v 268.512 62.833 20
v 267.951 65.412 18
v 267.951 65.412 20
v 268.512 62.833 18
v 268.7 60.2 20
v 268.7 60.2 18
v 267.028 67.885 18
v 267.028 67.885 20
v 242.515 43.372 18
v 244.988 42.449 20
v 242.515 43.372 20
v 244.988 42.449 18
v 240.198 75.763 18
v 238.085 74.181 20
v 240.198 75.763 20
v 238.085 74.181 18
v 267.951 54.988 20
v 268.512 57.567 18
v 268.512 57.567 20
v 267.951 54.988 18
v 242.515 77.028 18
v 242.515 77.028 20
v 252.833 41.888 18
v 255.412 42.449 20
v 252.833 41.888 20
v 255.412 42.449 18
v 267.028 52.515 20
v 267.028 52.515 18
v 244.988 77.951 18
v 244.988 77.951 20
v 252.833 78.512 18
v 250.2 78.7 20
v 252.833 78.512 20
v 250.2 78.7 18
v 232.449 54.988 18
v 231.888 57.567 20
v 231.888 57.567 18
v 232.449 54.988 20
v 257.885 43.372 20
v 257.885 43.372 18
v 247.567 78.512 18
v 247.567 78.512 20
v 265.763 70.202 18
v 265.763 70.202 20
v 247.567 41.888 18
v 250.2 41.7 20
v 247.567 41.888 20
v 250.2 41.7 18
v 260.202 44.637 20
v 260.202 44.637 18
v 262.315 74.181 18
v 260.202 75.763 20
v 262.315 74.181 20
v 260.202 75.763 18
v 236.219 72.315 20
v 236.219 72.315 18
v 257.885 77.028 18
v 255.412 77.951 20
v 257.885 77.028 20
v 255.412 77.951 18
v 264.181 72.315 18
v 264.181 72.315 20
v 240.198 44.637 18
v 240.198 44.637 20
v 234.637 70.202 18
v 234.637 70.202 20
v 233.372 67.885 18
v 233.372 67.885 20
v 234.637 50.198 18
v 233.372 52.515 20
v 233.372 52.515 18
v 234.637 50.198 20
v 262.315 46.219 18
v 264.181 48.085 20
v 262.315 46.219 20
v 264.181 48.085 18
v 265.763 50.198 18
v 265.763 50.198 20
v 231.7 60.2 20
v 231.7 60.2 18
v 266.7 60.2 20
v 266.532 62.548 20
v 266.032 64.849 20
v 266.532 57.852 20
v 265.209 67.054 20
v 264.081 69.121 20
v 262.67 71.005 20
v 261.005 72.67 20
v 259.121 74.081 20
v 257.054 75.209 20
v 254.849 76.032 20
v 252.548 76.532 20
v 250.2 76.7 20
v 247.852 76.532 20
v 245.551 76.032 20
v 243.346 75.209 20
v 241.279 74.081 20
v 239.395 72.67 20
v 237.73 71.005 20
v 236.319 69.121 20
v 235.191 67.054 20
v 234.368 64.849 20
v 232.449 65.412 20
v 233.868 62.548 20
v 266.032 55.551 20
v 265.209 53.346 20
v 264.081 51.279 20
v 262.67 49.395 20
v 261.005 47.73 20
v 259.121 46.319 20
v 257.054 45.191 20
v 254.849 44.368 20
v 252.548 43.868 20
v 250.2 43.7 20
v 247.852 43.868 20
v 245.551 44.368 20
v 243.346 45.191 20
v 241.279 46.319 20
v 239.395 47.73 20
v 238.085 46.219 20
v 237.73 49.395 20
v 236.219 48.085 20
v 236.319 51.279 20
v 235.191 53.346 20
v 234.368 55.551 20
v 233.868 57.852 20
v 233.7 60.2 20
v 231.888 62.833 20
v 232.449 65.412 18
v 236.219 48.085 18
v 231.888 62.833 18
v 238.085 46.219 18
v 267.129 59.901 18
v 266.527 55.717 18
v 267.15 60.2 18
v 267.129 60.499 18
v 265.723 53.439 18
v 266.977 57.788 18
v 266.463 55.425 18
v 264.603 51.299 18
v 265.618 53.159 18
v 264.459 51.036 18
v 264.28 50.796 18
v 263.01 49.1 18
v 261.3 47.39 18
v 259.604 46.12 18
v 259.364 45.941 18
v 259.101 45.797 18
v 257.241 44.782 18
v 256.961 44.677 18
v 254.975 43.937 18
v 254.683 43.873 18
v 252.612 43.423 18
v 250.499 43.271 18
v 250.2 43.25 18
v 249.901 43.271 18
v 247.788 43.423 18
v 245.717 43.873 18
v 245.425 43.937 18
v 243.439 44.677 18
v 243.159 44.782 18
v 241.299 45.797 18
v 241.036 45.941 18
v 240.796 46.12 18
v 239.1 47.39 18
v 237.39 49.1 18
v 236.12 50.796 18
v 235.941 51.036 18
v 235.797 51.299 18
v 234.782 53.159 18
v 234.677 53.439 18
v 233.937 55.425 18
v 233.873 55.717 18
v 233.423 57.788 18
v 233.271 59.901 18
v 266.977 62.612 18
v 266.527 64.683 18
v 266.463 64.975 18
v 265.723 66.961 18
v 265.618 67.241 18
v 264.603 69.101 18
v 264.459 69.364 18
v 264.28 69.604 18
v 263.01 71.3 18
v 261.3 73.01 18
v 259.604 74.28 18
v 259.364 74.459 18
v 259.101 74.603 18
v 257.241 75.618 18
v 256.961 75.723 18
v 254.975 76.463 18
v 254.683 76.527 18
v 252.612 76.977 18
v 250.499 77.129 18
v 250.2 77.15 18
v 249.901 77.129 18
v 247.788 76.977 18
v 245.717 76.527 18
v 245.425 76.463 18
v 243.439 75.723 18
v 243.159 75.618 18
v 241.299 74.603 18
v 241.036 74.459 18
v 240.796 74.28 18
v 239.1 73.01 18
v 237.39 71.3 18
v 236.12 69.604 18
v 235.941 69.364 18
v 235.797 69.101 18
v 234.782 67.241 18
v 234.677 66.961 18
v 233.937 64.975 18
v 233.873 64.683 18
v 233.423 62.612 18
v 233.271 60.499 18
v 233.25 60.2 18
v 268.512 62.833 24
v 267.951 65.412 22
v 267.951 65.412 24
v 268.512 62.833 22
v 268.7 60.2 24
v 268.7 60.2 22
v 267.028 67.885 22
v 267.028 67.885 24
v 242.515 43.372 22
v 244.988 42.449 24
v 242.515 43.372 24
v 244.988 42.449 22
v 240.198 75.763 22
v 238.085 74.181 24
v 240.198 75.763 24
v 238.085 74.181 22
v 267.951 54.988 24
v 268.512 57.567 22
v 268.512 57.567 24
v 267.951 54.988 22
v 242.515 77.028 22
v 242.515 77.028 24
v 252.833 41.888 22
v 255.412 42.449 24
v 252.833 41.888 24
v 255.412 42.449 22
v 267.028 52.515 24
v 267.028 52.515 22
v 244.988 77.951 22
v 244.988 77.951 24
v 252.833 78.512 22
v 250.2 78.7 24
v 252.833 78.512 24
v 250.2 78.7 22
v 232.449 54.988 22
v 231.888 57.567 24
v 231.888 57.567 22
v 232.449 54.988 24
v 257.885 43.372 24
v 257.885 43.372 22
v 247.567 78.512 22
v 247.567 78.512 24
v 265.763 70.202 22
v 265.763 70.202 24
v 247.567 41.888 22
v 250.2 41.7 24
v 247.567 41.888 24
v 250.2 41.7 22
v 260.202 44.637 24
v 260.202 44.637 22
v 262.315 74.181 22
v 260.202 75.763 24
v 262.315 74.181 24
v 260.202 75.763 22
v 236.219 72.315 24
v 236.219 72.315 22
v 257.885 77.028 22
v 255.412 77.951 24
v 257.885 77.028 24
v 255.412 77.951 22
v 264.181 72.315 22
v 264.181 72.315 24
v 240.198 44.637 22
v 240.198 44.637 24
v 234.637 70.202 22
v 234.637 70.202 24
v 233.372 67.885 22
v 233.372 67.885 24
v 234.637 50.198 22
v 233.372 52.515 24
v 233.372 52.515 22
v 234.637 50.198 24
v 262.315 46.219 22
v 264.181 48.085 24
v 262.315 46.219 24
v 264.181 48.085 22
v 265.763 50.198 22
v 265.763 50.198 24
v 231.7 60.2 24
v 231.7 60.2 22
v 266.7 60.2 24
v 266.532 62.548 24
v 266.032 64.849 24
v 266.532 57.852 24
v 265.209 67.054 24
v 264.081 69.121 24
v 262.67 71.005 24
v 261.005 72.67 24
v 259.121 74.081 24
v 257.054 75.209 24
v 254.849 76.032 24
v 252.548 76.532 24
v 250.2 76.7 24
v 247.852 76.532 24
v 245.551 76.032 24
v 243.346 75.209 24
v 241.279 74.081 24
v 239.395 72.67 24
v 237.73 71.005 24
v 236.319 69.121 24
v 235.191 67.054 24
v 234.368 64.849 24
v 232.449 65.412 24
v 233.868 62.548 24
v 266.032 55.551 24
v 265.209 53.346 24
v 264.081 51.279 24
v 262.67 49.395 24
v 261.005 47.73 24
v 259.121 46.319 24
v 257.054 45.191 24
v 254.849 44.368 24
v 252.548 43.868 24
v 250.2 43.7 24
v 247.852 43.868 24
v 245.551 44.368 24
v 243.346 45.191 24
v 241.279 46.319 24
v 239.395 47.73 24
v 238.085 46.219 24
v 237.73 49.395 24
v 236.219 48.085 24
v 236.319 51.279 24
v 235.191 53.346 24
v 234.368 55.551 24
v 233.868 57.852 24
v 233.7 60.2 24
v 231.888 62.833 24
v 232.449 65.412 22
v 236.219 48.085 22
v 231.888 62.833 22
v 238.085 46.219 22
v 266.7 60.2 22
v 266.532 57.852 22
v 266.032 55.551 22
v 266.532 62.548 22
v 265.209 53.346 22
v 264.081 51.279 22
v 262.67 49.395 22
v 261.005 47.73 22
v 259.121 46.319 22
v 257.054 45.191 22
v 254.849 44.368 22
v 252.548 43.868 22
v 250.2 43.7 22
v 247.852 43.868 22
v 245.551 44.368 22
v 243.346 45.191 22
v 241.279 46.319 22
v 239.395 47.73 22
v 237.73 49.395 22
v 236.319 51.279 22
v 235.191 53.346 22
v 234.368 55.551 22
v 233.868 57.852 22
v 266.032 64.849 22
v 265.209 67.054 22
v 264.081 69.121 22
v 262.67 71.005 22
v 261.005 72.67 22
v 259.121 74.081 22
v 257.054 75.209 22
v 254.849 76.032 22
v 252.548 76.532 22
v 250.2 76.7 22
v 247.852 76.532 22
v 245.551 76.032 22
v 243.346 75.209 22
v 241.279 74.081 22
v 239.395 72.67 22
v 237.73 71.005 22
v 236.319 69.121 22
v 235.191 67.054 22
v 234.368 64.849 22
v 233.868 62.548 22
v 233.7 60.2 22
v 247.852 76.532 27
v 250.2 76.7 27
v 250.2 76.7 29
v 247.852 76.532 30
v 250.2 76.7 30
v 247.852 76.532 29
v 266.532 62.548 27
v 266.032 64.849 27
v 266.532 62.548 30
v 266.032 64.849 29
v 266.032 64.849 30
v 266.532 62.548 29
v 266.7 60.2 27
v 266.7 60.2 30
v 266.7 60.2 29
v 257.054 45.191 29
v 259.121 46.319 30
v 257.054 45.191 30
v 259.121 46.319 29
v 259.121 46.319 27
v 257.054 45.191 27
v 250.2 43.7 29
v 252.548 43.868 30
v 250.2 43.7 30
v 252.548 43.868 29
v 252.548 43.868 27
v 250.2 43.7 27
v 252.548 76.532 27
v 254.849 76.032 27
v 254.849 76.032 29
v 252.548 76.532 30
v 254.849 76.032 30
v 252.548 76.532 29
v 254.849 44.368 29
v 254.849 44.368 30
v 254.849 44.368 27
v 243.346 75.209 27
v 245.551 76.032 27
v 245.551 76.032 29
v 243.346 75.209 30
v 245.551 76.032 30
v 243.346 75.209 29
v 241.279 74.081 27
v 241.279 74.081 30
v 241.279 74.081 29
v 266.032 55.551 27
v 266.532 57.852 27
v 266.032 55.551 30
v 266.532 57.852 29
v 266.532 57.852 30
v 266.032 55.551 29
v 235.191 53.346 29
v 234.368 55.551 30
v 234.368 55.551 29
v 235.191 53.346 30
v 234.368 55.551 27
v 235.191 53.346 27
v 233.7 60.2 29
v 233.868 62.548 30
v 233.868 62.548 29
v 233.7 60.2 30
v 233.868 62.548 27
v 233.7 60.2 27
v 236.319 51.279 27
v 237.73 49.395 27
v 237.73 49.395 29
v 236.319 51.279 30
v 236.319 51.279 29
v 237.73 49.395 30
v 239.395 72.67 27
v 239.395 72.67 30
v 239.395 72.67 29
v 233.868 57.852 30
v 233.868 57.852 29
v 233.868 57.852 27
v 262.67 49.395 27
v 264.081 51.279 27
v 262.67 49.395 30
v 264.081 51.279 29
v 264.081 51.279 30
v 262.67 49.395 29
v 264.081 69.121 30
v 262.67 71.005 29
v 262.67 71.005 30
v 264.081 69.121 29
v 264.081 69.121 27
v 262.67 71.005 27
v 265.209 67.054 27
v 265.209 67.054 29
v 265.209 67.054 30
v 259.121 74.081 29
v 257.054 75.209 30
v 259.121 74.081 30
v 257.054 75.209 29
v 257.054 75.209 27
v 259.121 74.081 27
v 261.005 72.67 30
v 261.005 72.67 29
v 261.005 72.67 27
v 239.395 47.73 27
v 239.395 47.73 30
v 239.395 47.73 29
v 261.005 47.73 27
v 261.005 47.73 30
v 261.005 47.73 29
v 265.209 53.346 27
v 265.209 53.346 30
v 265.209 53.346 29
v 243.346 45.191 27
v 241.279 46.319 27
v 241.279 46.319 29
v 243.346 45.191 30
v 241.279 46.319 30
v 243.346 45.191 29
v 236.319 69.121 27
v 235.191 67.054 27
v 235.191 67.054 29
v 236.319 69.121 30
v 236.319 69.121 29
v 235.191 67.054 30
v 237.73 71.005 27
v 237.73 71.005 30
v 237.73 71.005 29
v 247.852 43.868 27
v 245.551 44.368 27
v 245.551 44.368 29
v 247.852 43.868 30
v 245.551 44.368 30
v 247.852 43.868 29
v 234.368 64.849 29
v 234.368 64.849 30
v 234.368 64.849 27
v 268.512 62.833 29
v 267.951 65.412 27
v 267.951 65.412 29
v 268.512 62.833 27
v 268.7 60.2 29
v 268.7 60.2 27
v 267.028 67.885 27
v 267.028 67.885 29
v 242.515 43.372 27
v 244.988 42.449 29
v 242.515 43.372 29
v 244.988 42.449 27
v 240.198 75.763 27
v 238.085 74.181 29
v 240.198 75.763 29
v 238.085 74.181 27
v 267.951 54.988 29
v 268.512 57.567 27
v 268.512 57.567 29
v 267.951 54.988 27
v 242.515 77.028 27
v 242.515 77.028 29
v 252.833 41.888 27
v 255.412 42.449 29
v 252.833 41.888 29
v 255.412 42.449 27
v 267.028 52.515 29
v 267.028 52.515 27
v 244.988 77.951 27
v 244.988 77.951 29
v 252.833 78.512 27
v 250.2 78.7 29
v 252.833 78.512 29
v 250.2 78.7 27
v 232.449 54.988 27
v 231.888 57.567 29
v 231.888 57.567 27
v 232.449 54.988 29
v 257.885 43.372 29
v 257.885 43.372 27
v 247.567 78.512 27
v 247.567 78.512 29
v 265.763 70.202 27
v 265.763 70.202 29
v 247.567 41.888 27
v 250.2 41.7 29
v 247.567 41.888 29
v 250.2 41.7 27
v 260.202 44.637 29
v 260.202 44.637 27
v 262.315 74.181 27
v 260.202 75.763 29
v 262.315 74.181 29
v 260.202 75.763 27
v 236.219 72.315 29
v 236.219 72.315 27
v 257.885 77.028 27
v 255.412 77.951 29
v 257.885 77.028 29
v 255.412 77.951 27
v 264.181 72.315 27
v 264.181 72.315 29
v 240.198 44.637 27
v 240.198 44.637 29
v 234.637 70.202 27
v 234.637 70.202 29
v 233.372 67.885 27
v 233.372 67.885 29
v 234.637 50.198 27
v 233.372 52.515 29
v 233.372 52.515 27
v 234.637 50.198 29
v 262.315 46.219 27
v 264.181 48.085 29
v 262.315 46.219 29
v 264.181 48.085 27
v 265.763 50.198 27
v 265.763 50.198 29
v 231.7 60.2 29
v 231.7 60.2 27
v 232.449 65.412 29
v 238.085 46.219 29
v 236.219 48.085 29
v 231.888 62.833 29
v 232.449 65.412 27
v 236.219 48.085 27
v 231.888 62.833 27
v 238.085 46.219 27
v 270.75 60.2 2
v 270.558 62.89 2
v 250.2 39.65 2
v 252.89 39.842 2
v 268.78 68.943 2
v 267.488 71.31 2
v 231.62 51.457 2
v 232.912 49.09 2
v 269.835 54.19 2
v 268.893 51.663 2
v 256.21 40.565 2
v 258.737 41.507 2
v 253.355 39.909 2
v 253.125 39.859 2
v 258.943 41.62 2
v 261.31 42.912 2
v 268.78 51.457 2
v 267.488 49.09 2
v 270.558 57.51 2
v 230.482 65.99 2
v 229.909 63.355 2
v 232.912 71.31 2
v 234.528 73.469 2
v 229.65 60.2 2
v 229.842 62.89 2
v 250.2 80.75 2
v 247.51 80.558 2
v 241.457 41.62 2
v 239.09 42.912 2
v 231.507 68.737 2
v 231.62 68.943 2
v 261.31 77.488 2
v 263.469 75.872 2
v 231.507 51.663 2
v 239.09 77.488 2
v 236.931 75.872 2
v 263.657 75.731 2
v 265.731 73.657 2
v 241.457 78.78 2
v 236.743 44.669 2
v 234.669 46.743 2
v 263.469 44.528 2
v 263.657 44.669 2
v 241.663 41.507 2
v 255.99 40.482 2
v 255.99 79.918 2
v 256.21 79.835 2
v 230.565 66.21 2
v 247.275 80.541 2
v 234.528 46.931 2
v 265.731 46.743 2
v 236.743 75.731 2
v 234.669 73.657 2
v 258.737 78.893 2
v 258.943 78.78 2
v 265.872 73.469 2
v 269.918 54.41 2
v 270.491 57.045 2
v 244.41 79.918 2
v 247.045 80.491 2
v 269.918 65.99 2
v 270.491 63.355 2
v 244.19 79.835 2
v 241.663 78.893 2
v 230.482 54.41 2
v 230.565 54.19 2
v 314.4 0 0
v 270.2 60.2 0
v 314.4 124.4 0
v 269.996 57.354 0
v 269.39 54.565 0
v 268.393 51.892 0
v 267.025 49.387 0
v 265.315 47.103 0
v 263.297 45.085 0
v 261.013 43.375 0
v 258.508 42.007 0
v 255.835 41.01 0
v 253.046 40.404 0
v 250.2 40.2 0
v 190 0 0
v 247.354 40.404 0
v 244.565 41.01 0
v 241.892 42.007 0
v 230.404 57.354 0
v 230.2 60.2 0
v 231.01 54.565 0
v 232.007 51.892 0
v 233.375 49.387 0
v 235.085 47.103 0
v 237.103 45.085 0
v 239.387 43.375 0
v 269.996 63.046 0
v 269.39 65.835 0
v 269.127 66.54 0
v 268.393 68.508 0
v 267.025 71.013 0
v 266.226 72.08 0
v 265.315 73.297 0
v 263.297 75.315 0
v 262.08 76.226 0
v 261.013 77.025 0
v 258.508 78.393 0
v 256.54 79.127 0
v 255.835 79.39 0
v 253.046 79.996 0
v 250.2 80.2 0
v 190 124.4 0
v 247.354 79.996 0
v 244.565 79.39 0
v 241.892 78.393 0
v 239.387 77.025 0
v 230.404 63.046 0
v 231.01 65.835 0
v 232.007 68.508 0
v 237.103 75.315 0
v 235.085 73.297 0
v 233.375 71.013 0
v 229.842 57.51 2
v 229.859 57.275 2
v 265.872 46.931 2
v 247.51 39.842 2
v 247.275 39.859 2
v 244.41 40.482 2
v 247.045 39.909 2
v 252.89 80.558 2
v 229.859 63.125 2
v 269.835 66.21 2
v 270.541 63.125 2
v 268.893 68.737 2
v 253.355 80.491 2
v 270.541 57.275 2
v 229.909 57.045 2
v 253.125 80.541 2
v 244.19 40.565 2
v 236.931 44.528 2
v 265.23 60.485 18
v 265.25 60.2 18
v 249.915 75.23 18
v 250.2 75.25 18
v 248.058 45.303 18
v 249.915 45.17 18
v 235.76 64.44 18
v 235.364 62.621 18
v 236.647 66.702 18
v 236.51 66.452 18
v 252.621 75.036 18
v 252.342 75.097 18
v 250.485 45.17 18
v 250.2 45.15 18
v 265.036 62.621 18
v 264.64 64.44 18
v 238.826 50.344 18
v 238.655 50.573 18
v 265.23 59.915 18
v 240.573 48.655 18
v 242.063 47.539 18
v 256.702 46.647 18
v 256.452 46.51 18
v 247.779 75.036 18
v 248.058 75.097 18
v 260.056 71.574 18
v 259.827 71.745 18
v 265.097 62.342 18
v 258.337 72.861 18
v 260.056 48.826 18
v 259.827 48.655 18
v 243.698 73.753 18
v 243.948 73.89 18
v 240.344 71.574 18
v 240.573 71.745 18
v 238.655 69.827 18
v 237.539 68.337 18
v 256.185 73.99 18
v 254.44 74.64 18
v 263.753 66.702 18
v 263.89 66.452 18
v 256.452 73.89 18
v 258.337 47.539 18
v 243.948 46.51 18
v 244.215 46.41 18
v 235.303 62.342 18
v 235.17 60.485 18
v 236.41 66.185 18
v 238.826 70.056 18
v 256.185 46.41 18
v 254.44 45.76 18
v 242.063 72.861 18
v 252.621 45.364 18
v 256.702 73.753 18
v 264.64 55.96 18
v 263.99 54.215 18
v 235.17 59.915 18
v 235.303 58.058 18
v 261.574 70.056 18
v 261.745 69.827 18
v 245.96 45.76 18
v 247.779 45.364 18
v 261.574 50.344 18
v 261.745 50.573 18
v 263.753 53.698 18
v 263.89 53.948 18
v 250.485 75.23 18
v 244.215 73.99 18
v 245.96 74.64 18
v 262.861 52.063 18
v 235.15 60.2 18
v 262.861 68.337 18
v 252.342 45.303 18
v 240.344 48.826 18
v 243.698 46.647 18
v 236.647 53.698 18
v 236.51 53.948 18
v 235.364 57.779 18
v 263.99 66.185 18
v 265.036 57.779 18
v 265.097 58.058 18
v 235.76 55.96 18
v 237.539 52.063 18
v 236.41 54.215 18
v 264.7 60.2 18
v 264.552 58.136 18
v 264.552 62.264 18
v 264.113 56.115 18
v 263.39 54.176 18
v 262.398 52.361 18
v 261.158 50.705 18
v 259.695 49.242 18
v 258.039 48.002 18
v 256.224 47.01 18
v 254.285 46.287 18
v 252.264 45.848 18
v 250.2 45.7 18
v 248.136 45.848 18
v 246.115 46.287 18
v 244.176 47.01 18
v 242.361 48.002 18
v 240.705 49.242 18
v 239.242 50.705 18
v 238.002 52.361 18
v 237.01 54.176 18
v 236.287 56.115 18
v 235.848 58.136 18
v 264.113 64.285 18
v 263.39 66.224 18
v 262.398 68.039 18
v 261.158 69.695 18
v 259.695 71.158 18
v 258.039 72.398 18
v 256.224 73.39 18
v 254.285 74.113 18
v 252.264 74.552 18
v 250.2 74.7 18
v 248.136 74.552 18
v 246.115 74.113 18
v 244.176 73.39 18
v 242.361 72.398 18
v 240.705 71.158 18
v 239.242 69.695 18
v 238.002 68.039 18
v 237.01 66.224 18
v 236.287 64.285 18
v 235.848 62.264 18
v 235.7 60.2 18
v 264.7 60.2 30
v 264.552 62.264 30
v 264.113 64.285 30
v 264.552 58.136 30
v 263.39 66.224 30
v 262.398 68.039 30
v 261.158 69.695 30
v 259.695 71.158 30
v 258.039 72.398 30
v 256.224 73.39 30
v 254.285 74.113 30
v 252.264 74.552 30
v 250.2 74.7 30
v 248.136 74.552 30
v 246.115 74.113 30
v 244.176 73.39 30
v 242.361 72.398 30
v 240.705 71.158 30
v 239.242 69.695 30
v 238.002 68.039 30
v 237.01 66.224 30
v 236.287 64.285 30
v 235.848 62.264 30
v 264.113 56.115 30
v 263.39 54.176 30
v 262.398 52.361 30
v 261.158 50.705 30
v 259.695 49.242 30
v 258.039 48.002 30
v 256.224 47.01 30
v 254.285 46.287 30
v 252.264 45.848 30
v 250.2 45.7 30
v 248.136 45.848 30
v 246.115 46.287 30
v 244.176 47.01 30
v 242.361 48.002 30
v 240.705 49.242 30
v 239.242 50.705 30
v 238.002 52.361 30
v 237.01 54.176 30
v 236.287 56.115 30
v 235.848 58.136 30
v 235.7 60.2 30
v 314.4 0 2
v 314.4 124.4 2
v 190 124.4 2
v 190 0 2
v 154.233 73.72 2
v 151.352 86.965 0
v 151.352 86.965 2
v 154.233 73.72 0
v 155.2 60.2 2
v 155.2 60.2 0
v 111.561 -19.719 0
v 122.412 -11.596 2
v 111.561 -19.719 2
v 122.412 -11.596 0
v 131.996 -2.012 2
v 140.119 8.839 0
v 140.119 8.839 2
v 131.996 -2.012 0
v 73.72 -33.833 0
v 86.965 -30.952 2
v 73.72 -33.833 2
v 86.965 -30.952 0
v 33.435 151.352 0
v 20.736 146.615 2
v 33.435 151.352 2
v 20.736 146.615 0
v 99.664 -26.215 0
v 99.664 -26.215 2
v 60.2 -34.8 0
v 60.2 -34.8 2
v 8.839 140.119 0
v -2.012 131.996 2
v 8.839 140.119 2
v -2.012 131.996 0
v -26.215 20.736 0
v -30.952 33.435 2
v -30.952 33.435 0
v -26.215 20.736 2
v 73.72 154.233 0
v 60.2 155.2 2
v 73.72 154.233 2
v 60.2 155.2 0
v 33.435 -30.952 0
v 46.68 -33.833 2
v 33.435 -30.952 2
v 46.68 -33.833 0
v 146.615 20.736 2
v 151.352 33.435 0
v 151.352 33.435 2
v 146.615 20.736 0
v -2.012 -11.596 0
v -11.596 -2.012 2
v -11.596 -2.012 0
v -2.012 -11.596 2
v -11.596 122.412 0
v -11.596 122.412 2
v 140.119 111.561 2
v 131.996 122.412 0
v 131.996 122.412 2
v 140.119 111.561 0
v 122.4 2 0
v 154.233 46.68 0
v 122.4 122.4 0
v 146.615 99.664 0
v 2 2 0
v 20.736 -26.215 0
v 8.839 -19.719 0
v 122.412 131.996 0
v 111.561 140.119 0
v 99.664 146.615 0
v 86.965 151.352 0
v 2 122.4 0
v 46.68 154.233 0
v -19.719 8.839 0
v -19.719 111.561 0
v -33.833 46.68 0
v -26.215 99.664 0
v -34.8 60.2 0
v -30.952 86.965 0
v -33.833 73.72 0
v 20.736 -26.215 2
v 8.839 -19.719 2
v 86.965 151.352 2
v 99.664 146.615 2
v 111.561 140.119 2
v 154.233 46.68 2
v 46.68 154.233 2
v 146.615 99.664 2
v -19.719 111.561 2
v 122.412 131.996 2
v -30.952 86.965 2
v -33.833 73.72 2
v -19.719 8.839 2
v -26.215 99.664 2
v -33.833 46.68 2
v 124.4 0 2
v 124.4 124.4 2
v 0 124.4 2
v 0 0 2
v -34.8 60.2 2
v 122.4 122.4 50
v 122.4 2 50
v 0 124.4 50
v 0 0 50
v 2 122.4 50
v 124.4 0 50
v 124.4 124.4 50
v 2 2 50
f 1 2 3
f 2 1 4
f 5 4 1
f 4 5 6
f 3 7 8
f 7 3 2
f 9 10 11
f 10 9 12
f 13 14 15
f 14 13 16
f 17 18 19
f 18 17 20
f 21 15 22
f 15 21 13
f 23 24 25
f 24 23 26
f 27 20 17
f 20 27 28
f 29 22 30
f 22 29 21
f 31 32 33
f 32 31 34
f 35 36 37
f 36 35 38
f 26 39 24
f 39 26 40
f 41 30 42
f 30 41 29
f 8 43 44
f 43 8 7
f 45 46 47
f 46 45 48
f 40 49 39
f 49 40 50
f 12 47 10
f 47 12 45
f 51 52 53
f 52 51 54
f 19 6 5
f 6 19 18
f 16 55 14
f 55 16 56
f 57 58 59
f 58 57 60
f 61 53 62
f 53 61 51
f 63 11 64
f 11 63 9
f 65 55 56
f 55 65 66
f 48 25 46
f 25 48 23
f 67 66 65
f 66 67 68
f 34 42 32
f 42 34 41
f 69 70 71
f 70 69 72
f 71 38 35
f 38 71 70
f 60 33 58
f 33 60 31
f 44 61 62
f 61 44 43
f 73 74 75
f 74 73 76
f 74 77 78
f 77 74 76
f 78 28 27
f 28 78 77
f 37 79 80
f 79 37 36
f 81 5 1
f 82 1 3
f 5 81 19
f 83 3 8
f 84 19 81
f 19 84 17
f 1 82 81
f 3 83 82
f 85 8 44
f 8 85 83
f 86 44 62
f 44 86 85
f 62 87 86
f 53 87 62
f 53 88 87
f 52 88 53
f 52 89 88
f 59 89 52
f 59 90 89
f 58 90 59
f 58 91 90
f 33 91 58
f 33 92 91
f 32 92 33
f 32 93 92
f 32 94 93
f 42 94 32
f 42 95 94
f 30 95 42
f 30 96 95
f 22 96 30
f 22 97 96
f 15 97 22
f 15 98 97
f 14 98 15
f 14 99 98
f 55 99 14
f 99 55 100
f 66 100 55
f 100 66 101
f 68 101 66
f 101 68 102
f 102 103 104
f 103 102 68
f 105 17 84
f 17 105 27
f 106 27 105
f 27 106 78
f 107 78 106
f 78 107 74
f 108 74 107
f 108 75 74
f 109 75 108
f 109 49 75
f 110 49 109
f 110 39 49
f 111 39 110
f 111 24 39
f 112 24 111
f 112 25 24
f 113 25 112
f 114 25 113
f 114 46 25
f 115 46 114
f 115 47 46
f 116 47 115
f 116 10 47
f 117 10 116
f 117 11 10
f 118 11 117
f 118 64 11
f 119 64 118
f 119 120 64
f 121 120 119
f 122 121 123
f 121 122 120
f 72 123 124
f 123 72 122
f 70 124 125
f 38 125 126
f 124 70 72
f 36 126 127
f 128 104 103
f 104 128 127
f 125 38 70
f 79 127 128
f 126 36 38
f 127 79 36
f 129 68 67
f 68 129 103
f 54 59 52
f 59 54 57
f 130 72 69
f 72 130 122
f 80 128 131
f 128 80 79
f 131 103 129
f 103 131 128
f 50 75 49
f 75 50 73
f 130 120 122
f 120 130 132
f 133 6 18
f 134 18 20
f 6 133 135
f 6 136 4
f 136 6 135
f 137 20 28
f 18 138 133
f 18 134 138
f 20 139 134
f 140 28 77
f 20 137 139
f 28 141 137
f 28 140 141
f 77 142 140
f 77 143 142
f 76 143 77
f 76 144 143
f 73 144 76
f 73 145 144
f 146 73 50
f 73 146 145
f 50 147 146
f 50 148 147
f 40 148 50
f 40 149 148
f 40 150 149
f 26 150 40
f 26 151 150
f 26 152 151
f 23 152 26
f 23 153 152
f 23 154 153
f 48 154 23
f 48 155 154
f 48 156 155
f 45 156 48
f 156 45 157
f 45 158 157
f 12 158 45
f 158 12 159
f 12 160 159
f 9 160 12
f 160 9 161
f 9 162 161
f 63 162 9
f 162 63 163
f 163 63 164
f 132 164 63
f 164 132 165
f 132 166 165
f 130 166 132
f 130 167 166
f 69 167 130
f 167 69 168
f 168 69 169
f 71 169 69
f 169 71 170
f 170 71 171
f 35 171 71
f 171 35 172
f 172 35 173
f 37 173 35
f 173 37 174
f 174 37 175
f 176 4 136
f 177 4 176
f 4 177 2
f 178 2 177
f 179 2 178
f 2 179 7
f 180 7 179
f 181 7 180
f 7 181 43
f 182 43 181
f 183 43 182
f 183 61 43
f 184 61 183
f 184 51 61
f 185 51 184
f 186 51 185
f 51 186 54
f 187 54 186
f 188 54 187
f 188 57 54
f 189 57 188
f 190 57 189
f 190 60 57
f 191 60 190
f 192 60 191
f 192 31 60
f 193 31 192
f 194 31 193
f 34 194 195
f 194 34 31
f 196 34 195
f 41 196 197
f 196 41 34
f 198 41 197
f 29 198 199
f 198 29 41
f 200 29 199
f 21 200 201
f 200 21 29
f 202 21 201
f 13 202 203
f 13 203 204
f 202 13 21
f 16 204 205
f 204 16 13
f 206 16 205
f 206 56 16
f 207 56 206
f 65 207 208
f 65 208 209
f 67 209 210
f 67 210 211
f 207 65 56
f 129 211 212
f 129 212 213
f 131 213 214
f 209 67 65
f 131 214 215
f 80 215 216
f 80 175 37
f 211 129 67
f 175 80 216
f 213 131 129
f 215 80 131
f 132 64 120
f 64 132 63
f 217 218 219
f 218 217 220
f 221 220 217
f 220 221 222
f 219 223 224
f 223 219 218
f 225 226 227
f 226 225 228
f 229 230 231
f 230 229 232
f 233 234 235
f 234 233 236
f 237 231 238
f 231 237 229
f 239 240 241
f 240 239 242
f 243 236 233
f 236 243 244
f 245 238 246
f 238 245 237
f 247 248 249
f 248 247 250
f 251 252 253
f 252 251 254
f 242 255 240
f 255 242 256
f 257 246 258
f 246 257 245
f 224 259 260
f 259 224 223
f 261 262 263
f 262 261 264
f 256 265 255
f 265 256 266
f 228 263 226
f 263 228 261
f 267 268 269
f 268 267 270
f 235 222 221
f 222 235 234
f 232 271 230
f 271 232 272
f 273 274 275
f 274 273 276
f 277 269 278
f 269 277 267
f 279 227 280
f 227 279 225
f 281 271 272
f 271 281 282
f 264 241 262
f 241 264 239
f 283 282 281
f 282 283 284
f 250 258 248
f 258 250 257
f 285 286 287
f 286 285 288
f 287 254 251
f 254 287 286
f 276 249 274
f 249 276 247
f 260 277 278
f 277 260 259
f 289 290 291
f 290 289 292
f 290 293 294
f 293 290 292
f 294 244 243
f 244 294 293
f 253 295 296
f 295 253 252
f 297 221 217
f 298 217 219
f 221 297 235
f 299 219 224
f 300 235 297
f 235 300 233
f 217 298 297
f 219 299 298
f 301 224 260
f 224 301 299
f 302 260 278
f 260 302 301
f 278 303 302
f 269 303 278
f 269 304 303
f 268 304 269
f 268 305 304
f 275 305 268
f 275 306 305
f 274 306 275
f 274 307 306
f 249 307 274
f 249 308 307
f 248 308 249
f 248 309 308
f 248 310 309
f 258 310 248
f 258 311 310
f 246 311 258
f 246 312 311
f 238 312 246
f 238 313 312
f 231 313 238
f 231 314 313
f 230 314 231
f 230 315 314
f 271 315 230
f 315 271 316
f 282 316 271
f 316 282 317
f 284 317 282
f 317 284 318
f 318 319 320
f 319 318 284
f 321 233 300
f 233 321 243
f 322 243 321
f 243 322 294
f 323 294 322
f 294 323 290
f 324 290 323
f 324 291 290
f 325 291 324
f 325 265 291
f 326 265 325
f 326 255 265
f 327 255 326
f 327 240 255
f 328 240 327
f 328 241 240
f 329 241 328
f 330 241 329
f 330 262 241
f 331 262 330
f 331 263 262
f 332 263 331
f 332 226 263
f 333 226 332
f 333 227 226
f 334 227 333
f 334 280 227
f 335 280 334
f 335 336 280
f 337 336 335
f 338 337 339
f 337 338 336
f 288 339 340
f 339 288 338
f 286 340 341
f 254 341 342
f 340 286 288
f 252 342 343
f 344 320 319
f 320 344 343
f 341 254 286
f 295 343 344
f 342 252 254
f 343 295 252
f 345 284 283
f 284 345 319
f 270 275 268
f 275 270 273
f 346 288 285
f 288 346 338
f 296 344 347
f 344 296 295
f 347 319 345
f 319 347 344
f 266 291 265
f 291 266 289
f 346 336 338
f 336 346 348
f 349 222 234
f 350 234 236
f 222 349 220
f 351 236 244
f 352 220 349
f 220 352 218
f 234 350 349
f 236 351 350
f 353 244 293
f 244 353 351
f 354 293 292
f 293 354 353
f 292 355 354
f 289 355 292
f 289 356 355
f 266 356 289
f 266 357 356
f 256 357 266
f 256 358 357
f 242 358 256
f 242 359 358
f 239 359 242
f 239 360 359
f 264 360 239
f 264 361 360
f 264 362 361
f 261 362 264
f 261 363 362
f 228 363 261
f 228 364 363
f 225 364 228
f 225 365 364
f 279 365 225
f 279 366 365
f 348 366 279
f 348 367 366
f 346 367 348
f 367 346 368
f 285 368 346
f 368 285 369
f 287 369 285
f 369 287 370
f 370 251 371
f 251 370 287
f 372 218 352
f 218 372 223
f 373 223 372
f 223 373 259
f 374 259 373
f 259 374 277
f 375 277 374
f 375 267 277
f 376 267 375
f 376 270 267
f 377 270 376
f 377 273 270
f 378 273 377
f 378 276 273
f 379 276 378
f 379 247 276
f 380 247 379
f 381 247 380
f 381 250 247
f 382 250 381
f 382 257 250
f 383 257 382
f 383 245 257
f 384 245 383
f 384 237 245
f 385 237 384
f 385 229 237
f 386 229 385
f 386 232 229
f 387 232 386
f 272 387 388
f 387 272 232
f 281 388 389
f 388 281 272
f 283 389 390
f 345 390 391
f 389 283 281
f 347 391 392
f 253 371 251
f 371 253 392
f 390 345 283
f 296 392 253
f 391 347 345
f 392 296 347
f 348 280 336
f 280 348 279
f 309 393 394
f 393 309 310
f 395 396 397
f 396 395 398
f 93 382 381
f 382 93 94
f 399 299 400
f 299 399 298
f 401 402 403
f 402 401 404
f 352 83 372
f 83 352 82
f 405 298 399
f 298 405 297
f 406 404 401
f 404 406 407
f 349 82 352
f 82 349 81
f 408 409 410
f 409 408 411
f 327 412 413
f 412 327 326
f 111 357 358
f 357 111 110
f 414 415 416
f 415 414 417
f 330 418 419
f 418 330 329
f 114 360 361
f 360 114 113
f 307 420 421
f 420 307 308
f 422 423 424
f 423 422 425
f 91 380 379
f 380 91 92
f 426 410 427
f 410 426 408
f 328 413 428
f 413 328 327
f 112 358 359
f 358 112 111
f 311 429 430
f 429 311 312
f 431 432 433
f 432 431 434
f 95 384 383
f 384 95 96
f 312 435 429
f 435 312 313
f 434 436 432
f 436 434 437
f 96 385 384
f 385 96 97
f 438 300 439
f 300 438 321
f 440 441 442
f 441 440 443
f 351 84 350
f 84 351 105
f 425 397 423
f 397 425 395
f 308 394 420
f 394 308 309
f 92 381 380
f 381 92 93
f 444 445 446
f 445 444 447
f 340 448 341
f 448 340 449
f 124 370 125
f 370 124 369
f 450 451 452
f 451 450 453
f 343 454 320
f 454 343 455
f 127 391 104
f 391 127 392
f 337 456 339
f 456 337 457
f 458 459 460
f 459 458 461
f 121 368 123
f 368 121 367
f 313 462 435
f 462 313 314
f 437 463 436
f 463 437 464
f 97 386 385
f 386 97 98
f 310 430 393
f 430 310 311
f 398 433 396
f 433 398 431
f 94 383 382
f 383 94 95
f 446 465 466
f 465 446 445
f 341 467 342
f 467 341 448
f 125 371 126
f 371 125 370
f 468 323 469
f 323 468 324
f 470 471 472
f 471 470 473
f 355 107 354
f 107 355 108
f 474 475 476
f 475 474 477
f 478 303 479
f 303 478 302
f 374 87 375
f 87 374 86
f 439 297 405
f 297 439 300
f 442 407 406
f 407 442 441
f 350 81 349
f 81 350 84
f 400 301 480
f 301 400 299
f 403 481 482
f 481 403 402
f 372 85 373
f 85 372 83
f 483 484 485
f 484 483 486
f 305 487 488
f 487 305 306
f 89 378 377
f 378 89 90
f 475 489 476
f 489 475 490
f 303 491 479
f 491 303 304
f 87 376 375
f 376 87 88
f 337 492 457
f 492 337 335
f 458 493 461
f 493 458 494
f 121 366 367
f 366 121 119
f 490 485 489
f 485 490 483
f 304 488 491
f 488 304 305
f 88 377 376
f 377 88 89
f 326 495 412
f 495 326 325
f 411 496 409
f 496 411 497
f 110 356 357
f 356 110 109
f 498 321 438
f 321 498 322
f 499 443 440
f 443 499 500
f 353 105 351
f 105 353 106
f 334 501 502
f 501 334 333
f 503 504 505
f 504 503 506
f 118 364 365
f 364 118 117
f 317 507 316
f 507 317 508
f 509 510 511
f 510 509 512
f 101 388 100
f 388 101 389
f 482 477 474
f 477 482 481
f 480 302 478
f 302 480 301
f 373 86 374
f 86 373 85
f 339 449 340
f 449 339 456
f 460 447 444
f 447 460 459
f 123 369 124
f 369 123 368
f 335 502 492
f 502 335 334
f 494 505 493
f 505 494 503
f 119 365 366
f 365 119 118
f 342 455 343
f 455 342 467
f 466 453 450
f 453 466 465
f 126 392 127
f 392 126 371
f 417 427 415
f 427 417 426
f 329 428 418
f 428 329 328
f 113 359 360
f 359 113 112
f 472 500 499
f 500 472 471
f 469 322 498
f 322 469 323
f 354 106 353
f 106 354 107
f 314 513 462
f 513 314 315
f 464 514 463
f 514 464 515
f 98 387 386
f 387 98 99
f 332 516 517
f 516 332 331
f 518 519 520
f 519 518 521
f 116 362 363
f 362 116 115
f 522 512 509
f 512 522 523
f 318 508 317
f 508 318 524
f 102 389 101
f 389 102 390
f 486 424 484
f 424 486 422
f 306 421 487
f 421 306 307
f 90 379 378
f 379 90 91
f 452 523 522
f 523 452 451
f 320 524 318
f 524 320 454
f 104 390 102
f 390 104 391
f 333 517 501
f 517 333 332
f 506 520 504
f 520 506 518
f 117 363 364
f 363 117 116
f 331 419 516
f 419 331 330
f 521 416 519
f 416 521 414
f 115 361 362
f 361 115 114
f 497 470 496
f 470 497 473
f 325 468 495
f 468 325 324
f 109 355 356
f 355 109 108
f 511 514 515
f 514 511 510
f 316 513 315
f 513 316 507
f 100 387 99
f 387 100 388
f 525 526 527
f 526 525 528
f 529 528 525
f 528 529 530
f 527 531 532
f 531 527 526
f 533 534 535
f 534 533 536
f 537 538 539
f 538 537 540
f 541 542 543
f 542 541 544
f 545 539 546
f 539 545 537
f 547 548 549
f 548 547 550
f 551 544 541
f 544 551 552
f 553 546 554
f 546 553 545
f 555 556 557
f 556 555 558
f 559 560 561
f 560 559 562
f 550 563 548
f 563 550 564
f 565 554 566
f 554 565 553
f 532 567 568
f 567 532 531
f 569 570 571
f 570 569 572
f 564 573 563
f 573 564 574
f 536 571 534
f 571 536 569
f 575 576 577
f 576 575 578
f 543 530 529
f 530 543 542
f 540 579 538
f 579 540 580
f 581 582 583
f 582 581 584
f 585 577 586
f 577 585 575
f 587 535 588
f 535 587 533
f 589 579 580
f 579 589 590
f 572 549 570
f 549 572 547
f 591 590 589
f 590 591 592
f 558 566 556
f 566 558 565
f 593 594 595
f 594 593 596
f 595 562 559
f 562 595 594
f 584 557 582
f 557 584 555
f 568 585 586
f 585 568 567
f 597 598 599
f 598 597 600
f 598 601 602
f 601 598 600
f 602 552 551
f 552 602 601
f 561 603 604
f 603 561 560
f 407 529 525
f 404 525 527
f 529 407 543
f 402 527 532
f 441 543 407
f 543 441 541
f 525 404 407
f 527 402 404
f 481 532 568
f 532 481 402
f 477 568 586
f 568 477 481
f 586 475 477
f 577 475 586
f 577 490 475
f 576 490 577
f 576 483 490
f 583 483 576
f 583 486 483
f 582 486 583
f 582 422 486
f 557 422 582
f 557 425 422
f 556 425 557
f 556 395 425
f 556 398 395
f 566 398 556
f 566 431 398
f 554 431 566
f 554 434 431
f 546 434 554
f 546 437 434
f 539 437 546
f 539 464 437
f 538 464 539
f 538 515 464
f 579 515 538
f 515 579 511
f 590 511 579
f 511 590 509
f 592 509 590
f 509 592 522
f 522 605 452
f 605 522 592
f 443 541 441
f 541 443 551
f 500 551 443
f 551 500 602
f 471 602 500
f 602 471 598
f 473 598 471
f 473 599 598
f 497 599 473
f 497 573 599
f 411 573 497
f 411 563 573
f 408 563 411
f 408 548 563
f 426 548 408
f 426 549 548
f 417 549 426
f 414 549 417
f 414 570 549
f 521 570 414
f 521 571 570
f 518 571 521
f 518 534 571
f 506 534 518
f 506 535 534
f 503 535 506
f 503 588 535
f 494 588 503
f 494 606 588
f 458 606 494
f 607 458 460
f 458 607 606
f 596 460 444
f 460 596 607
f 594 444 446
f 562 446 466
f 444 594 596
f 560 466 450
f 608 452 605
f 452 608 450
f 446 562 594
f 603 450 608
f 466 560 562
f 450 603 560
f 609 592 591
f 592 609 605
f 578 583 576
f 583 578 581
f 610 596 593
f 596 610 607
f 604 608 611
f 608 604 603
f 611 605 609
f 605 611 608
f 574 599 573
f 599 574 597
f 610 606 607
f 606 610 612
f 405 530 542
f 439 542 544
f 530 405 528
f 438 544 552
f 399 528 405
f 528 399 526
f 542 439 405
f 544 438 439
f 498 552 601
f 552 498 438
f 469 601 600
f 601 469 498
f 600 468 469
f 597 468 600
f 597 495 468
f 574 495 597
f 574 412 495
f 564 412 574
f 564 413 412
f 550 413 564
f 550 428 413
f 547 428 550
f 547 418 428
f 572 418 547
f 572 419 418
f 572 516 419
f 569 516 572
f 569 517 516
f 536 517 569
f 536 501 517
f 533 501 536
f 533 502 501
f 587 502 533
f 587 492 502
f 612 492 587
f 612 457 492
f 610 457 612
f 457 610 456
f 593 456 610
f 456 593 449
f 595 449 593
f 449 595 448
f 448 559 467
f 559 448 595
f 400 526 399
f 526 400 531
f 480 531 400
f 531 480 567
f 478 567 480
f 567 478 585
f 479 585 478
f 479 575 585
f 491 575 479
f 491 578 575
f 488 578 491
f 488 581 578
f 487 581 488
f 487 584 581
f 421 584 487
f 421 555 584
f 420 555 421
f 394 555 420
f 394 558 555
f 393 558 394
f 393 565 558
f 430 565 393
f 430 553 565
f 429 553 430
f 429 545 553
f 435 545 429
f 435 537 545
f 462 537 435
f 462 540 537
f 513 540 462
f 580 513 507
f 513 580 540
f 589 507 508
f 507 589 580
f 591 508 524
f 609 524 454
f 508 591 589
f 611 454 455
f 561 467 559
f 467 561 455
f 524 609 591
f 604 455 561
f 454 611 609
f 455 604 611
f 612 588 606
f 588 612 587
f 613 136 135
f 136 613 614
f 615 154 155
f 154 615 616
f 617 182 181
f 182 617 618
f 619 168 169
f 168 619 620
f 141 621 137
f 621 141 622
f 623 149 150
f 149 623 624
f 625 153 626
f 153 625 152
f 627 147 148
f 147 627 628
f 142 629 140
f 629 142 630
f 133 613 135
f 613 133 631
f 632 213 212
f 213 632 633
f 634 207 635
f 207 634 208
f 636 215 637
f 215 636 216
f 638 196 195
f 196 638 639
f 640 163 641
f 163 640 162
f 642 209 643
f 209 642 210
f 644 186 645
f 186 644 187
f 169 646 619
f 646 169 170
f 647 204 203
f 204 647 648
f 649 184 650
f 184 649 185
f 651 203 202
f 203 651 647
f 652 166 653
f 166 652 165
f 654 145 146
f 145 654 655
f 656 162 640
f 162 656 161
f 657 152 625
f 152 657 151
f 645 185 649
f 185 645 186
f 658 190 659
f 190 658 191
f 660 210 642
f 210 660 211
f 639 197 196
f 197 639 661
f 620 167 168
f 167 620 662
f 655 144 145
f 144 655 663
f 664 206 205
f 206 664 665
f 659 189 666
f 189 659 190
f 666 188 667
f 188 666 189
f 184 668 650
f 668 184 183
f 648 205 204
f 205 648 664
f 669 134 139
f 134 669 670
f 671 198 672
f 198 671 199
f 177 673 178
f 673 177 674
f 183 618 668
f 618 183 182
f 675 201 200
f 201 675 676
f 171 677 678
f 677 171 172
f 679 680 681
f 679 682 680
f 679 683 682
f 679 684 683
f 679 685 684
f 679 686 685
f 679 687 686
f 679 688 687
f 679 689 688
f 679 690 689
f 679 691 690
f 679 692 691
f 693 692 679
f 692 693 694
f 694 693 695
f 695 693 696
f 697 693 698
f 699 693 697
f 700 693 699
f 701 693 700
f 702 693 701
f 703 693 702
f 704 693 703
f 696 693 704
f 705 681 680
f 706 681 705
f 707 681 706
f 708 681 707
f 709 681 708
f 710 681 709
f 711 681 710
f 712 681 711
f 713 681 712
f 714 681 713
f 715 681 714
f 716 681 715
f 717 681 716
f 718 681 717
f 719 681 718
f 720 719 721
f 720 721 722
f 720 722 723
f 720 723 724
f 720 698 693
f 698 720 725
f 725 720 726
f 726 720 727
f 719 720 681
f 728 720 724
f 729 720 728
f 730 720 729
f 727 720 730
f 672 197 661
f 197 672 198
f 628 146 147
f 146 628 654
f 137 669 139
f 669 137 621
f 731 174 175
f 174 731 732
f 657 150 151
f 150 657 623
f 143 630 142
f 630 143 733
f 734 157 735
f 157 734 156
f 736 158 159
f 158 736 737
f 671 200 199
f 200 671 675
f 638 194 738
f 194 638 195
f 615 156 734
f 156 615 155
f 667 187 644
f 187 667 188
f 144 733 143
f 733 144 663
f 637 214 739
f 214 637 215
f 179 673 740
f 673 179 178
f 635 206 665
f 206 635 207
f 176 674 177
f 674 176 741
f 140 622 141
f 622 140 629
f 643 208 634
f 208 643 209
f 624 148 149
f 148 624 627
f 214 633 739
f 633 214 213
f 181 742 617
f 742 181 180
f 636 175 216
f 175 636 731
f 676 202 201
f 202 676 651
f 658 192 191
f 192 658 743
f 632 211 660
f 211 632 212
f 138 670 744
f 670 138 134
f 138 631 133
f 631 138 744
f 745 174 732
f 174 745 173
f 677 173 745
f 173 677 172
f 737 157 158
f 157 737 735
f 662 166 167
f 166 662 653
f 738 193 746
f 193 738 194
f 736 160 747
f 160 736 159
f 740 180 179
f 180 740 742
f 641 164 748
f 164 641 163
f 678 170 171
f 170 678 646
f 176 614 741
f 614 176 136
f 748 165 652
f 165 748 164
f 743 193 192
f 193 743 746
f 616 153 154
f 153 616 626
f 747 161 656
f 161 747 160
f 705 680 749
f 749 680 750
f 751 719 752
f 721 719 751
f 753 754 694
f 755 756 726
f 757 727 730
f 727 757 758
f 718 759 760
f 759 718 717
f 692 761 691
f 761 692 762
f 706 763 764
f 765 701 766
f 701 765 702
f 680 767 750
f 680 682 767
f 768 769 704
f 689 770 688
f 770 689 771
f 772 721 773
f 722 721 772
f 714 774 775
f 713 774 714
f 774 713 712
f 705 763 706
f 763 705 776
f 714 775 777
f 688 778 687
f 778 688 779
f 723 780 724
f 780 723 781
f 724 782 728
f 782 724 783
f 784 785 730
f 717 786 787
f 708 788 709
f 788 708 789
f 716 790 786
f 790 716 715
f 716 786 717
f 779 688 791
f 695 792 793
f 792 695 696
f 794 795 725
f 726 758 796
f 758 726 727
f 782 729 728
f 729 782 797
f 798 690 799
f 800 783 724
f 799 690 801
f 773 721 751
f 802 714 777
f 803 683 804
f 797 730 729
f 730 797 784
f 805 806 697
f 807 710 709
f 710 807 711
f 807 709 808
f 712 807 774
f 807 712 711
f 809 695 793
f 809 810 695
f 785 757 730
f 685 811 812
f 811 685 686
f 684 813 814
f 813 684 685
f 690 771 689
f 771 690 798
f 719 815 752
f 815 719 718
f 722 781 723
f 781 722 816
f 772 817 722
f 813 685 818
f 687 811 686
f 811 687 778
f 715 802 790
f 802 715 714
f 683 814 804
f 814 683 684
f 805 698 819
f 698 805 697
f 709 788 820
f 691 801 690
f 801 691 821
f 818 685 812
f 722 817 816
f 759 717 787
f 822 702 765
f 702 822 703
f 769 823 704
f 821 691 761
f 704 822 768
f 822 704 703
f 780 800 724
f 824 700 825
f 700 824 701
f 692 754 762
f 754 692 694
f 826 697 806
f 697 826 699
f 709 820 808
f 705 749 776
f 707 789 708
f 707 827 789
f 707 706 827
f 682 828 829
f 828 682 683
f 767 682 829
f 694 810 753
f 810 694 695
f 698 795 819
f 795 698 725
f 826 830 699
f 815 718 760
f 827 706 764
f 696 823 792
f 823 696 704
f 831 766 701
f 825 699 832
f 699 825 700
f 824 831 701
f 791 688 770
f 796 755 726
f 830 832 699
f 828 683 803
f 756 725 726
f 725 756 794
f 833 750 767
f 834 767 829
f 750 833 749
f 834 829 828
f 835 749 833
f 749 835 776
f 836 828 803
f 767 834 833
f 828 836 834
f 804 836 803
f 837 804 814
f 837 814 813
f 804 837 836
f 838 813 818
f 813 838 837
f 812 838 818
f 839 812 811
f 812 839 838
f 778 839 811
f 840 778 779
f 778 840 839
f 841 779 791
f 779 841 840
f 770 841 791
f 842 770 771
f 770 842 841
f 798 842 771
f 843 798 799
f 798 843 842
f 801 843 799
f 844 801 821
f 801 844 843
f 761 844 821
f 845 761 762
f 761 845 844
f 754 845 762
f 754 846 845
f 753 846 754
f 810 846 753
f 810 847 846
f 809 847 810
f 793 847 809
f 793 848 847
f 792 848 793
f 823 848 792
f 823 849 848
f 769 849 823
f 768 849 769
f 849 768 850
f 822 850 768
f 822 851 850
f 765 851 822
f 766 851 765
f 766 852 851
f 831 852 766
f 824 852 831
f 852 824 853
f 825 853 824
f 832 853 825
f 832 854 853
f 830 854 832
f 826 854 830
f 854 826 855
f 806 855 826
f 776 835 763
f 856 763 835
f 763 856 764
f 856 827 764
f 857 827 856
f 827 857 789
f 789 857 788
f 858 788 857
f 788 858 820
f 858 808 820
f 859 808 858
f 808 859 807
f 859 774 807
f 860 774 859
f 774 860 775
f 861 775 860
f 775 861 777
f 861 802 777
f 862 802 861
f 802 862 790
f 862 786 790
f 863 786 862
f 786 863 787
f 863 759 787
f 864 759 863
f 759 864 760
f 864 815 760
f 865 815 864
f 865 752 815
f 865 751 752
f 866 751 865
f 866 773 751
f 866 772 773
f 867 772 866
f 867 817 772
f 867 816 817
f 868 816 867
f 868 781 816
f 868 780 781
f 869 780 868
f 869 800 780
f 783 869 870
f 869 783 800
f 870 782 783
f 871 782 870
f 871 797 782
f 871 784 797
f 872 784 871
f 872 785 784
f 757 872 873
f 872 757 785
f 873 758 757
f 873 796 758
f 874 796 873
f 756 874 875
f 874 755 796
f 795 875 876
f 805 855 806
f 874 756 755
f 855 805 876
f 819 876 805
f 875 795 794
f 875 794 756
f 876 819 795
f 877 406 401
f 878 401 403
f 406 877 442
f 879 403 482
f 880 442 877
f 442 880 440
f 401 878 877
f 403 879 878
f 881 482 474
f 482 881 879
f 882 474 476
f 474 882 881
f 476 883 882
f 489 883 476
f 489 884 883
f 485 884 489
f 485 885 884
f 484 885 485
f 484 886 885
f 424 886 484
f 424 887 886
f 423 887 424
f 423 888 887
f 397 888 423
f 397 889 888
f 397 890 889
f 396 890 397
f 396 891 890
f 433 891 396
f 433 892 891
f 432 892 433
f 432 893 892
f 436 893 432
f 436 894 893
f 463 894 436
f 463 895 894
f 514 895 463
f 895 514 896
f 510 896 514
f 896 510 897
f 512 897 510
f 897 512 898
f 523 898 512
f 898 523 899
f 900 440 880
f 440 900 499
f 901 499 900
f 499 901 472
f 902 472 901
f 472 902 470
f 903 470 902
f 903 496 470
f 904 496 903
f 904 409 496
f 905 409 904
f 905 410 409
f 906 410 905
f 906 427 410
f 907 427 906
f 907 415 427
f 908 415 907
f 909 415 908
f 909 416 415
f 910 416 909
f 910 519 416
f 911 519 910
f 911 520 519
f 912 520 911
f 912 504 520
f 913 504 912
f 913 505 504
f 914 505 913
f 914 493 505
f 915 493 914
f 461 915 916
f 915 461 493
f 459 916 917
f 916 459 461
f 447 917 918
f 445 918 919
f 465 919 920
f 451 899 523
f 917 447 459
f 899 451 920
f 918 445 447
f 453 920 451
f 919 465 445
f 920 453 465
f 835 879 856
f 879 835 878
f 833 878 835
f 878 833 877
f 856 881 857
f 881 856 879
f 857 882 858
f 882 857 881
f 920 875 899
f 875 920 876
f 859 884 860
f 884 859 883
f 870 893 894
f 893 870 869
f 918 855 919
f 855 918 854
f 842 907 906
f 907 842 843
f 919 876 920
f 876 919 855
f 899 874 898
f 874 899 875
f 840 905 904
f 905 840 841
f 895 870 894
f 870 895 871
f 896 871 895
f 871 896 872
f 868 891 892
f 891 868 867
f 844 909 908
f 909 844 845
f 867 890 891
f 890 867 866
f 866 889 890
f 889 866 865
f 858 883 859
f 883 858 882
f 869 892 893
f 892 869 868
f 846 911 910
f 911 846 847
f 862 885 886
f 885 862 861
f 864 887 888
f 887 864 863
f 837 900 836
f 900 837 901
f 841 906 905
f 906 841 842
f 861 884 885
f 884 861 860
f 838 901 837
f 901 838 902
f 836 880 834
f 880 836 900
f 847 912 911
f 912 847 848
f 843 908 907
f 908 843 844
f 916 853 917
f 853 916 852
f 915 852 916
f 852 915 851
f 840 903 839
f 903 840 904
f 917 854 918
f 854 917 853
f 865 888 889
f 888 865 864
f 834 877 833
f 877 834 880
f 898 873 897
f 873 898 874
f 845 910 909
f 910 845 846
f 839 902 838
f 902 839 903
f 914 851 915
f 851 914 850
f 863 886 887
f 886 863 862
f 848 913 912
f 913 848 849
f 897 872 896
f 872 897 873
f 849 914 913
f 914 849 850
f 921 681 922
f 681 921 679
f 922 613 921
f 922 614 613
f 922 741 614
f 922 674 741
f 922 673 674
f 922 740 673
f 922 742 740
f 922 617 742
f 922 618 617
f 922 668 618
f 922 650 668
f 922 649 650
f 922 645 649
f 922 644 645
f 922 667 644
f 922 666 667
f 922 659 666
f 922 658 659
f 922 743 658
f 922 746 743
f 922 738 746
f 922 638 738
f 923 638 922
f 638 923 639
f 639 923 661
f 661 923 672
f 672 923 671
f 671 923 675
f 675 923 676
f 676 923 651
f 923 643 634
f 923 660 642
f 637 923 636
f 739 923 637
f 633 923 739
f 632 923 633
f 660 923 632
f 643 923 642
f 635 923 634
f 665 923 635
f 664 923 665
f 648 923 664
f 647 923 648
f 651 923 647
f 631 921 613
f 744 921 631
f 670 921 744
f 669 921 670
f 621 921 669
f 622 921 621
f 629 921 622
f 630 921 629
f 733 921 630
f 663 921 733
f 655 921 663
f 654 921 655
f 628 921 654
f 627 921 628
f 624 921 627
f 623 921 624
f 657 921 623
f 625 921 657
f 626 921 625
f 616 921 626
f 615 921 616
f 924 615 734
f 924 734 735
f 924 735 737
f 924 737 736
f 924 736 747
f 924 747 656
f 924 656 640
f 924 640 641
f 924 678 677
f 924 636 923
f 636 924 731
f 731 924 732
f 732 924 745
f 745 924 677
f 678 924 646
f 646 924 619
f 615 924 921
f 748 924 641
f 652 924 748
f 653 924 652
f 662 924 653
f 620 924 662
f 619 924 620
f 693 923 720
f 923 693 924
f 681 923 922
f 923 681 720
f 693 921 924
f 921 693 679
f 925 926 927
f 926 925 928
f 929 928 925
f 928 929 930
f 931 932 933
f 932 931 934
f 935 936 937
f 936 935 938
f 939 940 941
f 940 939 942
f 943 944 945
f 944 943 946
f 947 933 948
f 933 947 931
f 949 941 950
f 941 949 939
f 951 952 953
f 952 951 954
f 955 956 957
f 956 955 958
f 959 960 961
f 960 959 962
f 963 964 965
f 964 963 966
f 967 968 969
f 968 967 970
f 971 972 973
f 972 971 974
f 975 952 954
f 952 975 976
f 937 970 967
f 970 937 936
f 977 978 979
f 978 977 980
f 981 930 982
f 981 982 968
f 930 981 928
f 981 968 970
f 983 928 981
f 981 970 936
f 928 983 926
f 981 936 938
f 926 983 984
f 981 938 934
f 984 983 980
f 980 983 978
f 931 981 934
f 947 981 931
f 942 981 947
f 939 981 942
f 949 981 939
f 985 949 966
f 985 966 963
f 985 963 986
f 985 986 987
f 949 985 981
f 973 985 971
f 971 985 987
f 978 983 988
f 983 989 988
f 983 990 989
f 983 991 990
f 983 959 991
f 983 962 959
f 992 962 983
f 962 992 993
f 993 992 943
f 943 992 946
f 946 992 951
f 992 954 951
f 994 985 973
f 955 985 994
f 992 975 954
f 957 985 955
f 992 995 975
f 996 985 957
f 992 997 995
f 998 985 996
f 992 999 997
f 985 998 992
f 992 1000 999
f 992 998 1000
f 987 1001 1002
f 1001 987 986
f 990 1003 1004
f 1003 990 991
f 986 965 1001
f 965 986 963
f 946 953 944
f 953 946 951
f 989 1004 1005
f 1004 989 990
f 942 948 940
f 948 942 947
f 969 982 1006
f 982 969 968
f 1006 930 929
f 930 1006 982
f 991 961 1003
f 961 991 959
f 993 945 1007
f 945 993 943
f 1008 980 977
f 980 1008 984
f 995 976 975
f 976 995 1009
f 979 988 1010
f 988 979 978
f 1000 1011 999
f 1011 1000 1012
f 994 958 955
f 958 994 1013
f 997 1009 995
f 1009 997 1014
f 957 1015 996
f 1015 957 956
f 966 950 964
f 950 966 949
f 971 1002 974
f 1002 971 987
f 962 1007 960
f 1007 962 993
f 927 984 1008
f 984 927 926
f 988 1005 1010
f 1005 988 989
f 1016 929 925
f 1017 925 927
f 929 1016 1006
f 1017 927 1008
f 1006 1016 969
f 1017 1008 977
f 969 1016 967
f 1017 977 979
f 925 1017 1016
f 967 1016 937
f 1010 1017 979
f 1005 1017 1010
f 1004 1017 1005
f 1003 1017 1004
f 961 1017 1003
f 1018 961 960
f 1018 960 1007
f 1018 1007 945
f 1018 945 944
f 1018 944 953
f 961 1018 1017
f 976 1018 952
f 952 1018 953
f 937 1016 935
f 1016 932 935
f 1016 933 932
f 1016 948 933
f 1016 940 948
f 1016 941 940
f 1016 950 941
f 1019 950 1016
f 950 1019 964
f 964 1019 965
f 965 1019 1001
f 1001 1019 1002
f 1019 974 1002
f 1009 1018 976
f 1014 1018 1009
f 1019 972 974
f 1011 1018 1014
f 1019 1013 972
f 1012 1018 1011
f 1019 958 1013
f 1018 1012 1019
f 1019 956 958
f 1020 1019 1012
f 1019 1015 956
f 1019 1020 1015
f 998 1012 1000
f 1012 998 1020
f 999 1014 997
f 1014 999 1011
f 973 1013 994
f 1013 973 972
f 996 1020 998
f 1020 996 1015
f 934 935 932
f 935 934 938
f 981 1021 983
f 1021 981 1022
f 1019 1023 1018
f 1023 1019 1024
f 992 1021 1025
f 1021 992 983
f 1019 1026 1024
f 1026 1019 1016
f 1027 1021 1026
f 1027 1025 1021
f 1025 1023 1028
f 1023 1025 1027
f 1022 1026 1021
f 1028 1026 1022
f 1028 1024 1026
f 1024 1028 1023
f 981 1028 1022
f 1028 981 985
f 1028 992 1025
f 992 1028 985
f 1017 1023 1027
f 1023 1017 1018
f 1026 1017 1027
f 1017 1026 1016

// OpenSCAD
/* [3D printer air filter settings]*/
// Markham Thomas   Jan 9th, 2018
// Openscad code to generate a fan box to hold a 120mm 12v PC chassis fan
// Uses a shopvac filter (solid plastic on one end and open at the other) 195mm in dia with 20mm rubber ring
// The 120mm fan goes into the fan box and blows into the shopvac filter creating a vacuum.  1 1/4" shopvac hose goes onto the box and into the 3d printer enclosure
// add a small amount to account for shrinkage
shrink_fix = 0.4;       //[0.1:.1:0.6]
// width of the fan on X axis
xwide = 120 + shrink_fix; //[10:5:200] 
// width of the fan on Y axis
ywide = 120 + shrink_fix; //[10:5:200]
// wall thickness
thickness = 2;          //[1:1:4]
// height of the fan (vertical) plus dead space (fan size again is good fit)
boxheight = 50;         //[10:10:80]
// diameter of the hose opening (larger than your hose diameter by 30%)
tubecutout = 40;        //[20:1:100]
// diamter of the flexible hose (internal ID, smaller than tubecutout)
plastic_tube_id = 33;   //[20:1:100]
// fan shroud thickness at thinest point
fan_outer_dia = 5;      //[1:1:20]
// square fan assumed, enter fan length (should be same as width)
fan = 120 + shrink_fix; //[10:5:200]
// diameter of the air filter
air_filter_dia = 190;   //[100:10:300]
// resolution of the cylinder used for the vacuum hose
resolution = 44;               //[12:4:88]

$fn = resolution;
translate([air_filter_dia, 0, -boxheight]) {
// rings on tube nozzle to help hold the vacuum hose on
for (i=[0,4,9]) {
    translate([xwide/2,ywide/2,boxheight+18+i]) {
        difference() {
            cylinder(h=2,r=(plastic_tube_id+thickness+2)/2);
            cylinder(h=2,r=(plastic_tube_id)/2);
        }
    }
}

// tube nozzle (tapered part after straight part to help seal)
translate([xwide/2,ywide/2,boxheight]) {
    difference() {
        cylinder(h=20,r1=(tubecutout+thickness)/2,r2=plastic_tube_id/2);
        cylinder(h=20,r1=(tubecutout)/2,r2=(plastic_tube_id-thickness-2)/2);
    }
}

// straight part of tube nozzle
translate([xwide/2,ywide/2,boxheight+18]) {
    difference() {
        cylinder(h=12,r1=plastic_tube_id/2,r2=plastic_tube_id/2);
        cylinder(h=12,r=(plastic_tube_id/2)-thickness);
    }
}

// top plate with tube nozzle cutout
translate([0,0,boxheight]) {
    difference() {
        cube([xwide+thickness*2,ywide+thickness*2,thickness]);
        translate([xwide/2,ywide/2,0]) cylinder(r=tubecutout/2,h=thickness);
    }
}
}
// Note: had to adjust to get the box edges to meet up.  I adjusted by 2mm so if you change the thickness adjust this value also
// origin X wall
cube([xwide+thickness,thickness, boxheight]);
// origin Y wall
cube([thickness,ywide+thickness,boxheight]);  // wall thickness
// farside from origin X wall
translate([0,ywide+thickness,0]) cube([xwide+thickness,thickness, boxheight]);
// farside from origin Y wall
translate([xwide+thickness,0,0]) cube([thickness,ywide+thickness*2, boxheight]);

// the bottom circular plate that connects to the shopvac rubber ring
difference() {
    translate([xwide/2,ywide/2,0]) cylinder(h=thickness, r=air_filter_dia/2,center=false);
    cube([fan+thickness,fan+thickness,thickness],false);
}
